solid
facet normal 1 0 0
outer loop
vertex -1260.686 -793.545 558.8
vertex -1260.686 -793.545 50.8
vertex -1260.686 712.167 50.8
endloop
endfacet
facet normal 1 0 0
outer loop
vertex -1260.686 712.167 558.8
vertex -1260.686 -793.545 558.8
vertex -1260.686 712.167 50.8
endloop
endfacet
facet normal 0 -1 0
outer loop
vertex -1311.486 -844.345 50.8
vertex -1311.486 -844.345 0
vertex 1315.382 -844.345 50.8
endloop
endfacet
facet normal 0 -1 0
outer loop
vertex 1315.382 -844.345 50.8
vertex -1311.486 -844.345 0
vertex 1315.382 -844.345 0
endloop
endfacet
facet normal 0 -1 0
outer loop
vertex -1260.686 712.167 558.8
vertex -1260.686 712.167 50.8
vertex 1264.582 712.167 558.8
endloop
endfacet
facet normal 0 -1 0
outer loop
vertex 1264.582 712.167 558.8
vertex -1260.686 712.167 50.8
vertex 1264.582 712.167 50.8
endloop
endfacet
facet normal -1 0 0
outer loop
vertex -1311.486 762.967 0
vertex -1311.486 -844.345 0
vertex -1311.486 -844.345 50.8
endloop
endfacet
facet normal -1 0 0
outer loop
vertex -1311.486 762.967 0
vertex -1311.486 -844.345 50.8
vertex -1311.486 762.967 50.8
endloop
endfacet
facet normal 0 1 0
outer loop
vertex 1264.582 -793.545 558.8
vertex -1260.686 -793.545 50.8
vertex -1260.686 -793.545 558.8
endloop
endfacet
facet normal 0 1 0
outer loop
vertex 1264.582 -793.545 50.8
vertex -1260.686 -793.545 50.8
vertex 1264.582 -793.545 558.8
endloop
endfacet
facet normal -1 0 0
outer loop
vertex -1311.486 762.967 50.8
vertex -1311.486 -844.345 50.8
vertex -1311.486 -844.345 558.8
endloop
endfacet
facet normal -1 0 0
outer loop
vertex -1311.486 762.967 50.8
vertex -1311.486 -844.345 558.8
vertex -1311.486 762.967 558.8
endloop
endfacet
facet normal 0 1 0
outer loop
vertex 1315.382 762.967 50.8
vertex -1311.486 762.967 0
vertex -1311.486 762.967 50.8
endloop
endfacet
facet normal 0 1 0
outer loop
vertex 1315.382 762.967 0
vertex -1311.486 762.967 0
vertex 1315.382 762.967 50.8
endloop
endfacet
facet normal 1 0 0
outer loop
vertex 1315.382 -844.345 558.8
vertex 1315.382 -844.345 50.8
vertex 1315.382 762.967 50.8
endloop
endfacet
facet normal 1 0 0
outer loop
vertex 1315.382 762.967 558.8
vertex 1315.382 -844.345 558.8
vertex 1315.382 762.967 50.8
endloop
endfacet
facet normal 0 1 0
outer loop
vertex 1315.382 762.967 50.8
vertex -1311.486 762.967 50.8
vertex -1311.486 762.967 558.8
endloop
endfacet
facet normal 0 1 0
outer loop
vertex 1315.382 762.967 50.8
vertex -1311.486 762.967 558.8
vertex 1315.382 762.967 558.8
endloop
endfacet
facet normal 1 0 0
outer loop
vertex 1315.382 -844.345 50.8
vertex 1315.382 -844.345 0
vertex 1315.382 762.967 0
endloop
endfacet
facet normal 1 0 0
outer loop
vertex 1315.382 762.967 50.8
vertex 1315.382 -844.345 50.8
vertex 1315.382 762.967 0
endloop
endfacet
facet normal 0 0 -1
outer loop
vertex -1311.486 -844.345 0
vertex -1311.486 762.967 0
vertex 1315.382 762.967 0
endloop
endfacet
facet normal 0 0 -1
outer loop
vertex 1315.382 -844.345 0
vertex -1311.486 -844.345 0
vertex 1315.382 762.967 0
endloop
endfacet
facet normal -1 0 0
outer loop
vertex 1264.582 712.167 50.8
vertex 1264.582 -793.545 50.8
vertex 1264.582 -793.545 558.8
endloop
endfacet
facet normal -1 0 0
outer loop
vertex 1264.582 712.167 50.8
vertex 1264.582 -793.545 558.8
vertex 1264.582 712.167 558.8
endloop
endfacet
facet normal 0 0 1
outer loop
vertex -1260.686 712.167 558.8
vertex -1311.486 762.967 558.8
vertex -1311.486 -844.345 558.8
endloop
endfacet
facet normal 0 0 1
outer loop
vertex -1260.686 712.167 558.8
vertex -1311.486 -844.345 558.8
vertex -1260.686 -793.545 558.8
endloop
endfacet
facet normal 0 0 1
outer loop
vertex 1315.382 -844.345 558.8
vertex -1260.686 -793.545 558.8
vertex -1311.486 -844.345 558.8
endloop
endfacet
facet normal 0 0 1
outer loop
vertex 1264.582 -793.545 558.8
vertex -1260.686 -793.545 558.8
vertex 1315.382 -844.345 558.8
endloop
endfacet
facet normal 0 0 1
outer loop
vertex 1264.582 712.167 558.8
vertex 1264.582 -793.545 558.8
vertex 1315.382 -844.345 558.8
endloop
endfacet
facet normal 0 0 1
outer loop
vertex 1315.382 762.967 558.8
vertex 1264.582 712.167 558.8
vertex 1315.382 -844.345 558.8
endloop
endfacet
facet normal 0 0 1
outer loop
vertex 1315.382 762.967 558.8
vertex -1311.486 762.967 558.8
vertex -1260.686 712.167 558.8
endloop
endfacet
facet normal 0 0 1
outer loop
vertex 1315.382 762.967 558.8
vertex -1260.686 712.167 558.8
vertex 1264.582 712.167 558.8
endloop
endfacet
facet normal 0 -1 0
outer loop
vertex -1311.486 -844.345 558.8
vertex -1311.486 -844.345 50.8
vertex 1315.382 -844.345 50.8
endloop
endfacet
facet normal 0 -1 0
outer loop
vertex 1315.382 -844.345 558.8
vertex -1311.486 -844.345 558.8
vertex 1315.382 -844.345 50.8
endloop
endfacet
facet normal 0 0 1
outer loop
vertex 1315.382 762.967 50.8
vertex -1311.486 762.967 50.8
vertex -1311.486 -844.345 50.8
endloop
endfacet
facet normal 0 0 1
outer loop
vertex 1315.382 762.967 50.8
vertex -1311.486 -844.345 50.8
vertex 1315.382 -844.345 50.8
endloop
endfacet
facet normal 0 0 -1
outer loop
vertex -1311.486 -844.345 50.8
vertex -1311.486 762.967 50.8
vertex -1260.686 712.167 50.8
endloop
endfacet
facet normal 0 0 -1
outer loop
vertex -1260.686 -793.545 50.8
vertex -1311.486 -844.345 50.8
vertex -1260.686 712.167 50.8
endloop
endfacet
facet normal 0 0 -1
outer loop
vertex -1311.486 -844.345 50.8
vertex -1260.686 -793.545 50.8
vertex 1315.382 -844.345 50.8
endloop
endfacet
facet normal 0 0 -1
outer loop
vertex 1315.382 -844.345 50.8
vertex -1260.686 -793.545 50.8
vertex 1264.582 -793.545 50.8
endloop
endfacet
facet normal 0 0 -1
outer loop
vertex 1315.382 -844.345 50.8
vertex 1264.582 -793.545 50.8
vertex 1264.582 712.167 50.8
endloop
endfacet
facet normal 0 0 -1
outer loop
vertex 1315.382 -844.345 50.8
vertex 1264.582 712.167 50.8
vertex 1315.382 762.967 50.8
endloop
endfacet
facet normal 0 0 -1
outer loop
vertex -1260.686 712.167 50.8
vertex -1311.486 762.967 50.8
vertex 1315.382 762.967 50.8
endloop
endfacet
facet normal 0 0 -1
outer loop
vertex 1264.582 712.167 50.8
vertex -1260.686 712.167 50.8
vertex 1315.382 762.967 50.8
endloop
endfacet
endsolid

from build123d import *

# Parameters (mm, degrees)
F0_W     = 2626.868
F0_H     = 1607.312
F1_DEPTH = 50.8
F2_W     = 2626.868
F2_H     = 1607.312
F2_W_2   = 2525.268
F2_H_2   = 1505.712
F3_DEPTH = 508


with BuildPart() as f1:
    # F0 (on Top) → F1 (new body)
    with BuildSketch(Plane.XY):
        with Locations((1.948226, -40.689194)):
            Rectangle(F0_W, F0_H)
    extrude(amount=F1_DEPTH)


with BuildPart() as f3:
    # F2 (on face) → F3 (new body)
    with BuildSketch(Plane.XY.offset(50.8)):
        with Locations((1.948226, -40.689194)):
            Rectangle(F2_W, F2_H)
        with Locations((1.948226, -40.689194)):
            Rectangle(F2_W_2, F2_H_2, mode=Mode.SUBTRACT)
    extrude(amount=F3_DEPTH)


solid = Compound([f1.part, f3.part])
